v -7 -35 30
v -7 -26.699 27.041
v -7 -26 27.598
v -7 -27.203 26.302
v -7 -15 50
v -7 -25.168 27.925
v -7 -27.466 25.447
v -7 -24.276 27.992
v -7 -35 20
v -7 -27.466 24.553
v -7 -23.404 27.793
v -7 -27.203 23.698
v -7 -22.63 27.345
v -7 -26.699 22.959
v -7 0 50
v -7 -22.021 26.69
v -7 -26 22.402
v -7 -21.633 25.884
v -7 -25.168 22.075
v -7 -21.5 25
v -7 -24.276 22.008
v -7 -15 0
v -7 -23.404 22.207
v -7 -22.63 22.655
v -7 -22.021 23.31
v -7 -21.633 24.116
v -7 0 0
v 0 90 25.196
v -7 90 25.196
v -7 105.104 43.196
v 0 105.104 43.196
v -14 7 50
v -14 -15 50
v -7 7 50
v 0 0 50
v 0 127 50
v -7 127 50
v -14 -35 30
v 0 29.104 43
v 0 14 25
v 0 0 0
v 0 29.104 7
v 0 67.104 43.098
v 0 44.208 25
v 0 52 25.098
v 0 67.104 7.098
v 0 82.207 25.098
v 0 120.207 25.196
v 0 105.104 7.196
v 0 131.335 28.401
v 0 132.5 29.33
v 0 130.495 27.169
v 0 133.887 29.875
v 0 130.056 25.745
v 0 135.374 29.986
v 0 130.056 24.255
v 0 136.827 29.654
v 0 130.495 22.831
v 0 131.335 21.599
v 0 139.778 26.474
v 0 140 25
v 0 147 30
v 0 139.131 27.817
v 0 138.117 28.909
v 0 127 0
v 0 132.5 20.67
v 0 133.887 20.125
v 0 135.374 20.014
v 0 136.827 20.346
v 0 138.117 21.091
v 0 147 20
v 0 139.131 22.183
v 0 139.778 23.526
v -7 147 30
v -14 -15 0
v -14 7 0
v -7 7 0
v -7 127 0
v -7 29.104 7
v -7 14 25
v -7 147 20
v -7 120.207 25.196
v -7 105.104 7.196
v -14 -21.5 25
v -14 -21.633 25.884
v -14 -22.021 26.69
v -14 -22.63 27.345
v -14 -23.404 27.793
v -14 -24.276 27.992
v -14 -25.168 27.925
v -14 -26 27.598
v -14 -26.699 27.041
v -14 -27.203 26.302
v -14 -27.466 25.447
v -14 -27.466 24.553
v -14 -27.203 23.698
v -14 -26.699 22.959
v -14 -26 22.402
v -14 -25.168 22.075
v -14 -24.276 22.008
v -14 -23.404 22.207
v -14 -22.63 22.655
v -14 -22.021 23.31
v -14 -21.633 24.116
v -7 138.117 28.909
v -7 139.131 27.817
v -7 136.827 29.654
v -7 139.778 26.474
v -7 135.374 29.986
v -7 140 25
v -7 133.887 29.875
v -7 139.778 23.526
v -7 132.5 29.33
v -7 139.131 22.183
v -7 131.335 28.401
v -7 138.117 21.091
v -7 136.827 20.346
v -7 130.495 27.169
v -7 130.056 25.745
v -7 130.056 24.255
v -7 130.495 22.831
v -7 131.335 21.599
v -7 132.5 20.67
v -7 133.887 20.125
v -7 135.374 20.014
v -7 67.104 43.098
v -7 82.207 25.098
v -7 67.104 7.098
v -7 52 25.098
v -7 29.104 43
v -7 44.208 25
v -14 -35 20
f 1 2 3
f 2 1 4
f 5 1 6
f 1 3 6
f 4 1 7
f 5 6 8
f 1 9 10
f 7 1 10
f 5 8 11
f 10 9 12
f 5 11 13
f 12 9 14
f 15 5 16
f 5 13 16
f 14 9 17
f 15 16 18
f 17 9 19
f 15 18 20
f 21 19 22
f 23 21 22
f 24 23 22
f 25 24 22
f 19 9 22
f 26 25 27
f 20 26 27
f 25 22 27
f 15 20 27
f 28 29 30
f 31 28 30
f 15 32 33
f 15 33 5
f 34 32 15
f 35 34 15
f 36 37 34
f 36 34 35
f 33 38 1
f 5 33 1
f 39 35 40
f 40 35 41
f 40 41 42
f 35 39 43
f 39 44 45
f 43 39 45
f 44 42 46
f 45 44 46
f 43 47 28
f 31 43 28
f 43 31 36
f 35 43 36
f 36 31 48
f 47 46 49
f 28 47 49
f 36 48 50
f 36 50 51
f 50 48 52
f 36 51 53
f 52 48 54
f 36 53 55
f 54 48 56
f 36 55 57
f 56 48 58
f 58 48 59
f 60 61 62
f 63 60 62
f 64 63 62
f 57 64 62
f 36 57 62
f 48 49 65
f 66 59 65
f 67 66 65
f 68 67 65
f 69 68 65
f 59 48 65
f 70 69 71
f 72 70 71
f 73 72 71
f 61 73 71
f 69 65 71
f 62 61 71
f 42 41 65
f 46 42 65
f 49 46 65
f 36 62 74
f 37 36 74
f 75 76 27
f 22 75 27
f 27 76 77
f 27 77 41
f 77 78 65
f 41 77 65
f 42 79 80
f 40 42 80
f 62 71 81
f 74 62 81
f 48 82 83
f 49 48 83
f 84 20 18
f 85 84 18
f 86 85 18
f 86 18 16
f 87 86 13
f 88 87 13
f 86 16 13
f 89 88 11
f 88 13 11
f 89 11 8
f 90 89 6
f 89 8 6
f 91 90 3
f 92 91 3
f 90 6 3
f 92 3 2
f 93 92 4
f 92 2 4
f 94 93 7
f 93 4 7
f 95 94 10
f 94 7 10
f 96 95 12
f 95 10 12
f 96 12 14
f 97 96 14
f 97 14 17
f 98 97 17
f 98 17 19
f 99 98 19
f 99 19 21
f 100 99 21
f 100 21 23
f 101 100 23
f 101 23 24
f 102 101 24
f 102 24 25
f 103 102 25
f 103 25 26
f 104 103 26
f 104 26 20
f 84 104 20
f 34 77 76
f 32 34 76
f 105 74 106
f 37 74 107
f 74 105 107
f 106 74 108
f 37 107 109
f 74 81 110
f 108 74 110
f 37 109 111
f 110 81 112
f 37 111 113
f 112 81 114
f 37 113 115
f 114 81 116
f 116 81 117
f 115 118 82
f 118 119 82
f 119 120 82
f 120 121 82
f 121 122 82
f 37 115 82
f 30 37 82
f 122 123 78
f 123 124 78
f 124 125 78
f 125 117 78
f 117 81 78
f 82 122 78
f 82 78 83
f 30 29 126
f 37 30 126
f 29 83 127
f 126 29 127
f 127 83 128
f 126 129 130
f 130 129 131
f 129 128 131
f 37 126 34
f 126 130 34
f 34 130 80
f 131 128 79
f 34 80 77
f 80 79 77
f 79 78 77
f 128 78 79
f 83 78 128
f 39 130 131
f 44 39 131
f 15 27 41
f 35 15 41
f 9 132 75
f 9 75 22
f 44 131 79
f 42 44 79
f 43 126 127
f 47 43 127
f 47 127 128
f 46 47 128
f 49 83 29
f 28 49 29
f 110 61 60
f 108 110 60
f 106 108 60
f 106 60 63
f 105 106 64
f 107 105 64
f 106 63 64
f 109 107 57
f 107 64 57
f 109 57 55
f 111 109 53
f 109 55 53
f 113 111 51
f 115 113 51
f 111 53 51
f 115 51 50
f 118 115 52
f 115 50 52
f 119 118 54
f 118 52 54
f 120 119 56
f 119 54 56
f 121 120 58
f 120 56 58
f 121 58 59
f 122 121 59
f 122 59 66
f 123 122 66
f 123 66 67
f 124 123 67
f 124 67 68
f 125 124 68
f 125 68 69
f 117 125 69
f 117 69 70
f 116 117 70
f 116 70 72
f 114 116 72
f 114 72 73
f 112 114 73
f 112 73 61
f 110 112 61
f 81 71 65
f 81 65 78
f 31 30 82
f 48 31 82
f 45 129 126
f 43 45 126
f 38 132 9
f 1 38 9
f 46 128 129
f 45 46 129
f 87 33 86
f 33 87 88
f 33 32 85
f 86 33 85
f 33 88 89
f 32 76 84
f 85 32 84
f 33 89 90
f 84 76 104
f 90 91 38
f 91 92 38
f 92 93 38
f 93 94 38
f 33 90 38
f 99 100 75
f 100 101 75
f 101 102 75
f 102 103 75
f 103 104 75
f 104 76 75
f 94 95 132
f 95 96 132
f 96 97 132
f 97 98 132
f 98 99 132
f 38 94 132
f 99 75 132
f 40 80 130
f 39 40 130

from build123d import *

# Parameters (mm, degrees)
F1_DEPTH = 50
F2_R     = 3
F2_R_2   = 5
F3_DEPTH = 25
F5_DEPTH = 25
F6_SIZE2 = 20
F6_SIZE  = 20


with BuildPart() as f1:
    # F0 (on Top) → F1 (new body)
    with BuildSketch(Plane.XY):
        Polygon((-14, 7), (-14, -35), (-7, -35), (-7, 0), (0, 0), (0, 147), (-7, 147), (-7, 7), align=None)
    extrude(amount=F1_DEPTH)

    # F2 (on Right) → F3 (cut)
    with BuildSketch(Plane.YZ):
        with Locations((-24.5, 25)):
            Circle(F2_R)
        with Locations((135, 25)):
            Circle(F2_R_2)
    extrude(amount=-F3_DEPTH, mode=Mode.SUBTRACT)

    # F4 (on face) → F5 (cut)
    with BuildSketch(Plane(origin=(-7, 0, 0), x_dir=(0, -1, 0), z_dir=(-1, 0, 0))):
        Polygon((-89.999746, 25.19642), (-105.10354, 43.19642), (-120.207333, 25.19642), (-105.10354, 7.19642), align=None)
        Polygon((-51.999873, 25.09821), (-67.103666, 43.09821), (-82.20746, 25.09821), (-67.103666, 7.09821), align=None)
        Polygon((-44.207587, 25), (-29.103793, 7), (-14, 25), (-29.103793, 43), align=None)
    extrude(amount=-F5_DEPTH, mode=Mode.SUBTRACT)

    # F6
    f6_edges = [f1.edges().sort_by_distance(p)[0] for p in [
        (-3.5, 147, 50),
        (-3.5, 147, 0),
        (-10.5, -35, 50),
        (-10.5, -35, 0),
    ]]
    chamfer(f6_edges, length=F6_SIZE, length2=F6_SIZE2)


solid = f1.part
